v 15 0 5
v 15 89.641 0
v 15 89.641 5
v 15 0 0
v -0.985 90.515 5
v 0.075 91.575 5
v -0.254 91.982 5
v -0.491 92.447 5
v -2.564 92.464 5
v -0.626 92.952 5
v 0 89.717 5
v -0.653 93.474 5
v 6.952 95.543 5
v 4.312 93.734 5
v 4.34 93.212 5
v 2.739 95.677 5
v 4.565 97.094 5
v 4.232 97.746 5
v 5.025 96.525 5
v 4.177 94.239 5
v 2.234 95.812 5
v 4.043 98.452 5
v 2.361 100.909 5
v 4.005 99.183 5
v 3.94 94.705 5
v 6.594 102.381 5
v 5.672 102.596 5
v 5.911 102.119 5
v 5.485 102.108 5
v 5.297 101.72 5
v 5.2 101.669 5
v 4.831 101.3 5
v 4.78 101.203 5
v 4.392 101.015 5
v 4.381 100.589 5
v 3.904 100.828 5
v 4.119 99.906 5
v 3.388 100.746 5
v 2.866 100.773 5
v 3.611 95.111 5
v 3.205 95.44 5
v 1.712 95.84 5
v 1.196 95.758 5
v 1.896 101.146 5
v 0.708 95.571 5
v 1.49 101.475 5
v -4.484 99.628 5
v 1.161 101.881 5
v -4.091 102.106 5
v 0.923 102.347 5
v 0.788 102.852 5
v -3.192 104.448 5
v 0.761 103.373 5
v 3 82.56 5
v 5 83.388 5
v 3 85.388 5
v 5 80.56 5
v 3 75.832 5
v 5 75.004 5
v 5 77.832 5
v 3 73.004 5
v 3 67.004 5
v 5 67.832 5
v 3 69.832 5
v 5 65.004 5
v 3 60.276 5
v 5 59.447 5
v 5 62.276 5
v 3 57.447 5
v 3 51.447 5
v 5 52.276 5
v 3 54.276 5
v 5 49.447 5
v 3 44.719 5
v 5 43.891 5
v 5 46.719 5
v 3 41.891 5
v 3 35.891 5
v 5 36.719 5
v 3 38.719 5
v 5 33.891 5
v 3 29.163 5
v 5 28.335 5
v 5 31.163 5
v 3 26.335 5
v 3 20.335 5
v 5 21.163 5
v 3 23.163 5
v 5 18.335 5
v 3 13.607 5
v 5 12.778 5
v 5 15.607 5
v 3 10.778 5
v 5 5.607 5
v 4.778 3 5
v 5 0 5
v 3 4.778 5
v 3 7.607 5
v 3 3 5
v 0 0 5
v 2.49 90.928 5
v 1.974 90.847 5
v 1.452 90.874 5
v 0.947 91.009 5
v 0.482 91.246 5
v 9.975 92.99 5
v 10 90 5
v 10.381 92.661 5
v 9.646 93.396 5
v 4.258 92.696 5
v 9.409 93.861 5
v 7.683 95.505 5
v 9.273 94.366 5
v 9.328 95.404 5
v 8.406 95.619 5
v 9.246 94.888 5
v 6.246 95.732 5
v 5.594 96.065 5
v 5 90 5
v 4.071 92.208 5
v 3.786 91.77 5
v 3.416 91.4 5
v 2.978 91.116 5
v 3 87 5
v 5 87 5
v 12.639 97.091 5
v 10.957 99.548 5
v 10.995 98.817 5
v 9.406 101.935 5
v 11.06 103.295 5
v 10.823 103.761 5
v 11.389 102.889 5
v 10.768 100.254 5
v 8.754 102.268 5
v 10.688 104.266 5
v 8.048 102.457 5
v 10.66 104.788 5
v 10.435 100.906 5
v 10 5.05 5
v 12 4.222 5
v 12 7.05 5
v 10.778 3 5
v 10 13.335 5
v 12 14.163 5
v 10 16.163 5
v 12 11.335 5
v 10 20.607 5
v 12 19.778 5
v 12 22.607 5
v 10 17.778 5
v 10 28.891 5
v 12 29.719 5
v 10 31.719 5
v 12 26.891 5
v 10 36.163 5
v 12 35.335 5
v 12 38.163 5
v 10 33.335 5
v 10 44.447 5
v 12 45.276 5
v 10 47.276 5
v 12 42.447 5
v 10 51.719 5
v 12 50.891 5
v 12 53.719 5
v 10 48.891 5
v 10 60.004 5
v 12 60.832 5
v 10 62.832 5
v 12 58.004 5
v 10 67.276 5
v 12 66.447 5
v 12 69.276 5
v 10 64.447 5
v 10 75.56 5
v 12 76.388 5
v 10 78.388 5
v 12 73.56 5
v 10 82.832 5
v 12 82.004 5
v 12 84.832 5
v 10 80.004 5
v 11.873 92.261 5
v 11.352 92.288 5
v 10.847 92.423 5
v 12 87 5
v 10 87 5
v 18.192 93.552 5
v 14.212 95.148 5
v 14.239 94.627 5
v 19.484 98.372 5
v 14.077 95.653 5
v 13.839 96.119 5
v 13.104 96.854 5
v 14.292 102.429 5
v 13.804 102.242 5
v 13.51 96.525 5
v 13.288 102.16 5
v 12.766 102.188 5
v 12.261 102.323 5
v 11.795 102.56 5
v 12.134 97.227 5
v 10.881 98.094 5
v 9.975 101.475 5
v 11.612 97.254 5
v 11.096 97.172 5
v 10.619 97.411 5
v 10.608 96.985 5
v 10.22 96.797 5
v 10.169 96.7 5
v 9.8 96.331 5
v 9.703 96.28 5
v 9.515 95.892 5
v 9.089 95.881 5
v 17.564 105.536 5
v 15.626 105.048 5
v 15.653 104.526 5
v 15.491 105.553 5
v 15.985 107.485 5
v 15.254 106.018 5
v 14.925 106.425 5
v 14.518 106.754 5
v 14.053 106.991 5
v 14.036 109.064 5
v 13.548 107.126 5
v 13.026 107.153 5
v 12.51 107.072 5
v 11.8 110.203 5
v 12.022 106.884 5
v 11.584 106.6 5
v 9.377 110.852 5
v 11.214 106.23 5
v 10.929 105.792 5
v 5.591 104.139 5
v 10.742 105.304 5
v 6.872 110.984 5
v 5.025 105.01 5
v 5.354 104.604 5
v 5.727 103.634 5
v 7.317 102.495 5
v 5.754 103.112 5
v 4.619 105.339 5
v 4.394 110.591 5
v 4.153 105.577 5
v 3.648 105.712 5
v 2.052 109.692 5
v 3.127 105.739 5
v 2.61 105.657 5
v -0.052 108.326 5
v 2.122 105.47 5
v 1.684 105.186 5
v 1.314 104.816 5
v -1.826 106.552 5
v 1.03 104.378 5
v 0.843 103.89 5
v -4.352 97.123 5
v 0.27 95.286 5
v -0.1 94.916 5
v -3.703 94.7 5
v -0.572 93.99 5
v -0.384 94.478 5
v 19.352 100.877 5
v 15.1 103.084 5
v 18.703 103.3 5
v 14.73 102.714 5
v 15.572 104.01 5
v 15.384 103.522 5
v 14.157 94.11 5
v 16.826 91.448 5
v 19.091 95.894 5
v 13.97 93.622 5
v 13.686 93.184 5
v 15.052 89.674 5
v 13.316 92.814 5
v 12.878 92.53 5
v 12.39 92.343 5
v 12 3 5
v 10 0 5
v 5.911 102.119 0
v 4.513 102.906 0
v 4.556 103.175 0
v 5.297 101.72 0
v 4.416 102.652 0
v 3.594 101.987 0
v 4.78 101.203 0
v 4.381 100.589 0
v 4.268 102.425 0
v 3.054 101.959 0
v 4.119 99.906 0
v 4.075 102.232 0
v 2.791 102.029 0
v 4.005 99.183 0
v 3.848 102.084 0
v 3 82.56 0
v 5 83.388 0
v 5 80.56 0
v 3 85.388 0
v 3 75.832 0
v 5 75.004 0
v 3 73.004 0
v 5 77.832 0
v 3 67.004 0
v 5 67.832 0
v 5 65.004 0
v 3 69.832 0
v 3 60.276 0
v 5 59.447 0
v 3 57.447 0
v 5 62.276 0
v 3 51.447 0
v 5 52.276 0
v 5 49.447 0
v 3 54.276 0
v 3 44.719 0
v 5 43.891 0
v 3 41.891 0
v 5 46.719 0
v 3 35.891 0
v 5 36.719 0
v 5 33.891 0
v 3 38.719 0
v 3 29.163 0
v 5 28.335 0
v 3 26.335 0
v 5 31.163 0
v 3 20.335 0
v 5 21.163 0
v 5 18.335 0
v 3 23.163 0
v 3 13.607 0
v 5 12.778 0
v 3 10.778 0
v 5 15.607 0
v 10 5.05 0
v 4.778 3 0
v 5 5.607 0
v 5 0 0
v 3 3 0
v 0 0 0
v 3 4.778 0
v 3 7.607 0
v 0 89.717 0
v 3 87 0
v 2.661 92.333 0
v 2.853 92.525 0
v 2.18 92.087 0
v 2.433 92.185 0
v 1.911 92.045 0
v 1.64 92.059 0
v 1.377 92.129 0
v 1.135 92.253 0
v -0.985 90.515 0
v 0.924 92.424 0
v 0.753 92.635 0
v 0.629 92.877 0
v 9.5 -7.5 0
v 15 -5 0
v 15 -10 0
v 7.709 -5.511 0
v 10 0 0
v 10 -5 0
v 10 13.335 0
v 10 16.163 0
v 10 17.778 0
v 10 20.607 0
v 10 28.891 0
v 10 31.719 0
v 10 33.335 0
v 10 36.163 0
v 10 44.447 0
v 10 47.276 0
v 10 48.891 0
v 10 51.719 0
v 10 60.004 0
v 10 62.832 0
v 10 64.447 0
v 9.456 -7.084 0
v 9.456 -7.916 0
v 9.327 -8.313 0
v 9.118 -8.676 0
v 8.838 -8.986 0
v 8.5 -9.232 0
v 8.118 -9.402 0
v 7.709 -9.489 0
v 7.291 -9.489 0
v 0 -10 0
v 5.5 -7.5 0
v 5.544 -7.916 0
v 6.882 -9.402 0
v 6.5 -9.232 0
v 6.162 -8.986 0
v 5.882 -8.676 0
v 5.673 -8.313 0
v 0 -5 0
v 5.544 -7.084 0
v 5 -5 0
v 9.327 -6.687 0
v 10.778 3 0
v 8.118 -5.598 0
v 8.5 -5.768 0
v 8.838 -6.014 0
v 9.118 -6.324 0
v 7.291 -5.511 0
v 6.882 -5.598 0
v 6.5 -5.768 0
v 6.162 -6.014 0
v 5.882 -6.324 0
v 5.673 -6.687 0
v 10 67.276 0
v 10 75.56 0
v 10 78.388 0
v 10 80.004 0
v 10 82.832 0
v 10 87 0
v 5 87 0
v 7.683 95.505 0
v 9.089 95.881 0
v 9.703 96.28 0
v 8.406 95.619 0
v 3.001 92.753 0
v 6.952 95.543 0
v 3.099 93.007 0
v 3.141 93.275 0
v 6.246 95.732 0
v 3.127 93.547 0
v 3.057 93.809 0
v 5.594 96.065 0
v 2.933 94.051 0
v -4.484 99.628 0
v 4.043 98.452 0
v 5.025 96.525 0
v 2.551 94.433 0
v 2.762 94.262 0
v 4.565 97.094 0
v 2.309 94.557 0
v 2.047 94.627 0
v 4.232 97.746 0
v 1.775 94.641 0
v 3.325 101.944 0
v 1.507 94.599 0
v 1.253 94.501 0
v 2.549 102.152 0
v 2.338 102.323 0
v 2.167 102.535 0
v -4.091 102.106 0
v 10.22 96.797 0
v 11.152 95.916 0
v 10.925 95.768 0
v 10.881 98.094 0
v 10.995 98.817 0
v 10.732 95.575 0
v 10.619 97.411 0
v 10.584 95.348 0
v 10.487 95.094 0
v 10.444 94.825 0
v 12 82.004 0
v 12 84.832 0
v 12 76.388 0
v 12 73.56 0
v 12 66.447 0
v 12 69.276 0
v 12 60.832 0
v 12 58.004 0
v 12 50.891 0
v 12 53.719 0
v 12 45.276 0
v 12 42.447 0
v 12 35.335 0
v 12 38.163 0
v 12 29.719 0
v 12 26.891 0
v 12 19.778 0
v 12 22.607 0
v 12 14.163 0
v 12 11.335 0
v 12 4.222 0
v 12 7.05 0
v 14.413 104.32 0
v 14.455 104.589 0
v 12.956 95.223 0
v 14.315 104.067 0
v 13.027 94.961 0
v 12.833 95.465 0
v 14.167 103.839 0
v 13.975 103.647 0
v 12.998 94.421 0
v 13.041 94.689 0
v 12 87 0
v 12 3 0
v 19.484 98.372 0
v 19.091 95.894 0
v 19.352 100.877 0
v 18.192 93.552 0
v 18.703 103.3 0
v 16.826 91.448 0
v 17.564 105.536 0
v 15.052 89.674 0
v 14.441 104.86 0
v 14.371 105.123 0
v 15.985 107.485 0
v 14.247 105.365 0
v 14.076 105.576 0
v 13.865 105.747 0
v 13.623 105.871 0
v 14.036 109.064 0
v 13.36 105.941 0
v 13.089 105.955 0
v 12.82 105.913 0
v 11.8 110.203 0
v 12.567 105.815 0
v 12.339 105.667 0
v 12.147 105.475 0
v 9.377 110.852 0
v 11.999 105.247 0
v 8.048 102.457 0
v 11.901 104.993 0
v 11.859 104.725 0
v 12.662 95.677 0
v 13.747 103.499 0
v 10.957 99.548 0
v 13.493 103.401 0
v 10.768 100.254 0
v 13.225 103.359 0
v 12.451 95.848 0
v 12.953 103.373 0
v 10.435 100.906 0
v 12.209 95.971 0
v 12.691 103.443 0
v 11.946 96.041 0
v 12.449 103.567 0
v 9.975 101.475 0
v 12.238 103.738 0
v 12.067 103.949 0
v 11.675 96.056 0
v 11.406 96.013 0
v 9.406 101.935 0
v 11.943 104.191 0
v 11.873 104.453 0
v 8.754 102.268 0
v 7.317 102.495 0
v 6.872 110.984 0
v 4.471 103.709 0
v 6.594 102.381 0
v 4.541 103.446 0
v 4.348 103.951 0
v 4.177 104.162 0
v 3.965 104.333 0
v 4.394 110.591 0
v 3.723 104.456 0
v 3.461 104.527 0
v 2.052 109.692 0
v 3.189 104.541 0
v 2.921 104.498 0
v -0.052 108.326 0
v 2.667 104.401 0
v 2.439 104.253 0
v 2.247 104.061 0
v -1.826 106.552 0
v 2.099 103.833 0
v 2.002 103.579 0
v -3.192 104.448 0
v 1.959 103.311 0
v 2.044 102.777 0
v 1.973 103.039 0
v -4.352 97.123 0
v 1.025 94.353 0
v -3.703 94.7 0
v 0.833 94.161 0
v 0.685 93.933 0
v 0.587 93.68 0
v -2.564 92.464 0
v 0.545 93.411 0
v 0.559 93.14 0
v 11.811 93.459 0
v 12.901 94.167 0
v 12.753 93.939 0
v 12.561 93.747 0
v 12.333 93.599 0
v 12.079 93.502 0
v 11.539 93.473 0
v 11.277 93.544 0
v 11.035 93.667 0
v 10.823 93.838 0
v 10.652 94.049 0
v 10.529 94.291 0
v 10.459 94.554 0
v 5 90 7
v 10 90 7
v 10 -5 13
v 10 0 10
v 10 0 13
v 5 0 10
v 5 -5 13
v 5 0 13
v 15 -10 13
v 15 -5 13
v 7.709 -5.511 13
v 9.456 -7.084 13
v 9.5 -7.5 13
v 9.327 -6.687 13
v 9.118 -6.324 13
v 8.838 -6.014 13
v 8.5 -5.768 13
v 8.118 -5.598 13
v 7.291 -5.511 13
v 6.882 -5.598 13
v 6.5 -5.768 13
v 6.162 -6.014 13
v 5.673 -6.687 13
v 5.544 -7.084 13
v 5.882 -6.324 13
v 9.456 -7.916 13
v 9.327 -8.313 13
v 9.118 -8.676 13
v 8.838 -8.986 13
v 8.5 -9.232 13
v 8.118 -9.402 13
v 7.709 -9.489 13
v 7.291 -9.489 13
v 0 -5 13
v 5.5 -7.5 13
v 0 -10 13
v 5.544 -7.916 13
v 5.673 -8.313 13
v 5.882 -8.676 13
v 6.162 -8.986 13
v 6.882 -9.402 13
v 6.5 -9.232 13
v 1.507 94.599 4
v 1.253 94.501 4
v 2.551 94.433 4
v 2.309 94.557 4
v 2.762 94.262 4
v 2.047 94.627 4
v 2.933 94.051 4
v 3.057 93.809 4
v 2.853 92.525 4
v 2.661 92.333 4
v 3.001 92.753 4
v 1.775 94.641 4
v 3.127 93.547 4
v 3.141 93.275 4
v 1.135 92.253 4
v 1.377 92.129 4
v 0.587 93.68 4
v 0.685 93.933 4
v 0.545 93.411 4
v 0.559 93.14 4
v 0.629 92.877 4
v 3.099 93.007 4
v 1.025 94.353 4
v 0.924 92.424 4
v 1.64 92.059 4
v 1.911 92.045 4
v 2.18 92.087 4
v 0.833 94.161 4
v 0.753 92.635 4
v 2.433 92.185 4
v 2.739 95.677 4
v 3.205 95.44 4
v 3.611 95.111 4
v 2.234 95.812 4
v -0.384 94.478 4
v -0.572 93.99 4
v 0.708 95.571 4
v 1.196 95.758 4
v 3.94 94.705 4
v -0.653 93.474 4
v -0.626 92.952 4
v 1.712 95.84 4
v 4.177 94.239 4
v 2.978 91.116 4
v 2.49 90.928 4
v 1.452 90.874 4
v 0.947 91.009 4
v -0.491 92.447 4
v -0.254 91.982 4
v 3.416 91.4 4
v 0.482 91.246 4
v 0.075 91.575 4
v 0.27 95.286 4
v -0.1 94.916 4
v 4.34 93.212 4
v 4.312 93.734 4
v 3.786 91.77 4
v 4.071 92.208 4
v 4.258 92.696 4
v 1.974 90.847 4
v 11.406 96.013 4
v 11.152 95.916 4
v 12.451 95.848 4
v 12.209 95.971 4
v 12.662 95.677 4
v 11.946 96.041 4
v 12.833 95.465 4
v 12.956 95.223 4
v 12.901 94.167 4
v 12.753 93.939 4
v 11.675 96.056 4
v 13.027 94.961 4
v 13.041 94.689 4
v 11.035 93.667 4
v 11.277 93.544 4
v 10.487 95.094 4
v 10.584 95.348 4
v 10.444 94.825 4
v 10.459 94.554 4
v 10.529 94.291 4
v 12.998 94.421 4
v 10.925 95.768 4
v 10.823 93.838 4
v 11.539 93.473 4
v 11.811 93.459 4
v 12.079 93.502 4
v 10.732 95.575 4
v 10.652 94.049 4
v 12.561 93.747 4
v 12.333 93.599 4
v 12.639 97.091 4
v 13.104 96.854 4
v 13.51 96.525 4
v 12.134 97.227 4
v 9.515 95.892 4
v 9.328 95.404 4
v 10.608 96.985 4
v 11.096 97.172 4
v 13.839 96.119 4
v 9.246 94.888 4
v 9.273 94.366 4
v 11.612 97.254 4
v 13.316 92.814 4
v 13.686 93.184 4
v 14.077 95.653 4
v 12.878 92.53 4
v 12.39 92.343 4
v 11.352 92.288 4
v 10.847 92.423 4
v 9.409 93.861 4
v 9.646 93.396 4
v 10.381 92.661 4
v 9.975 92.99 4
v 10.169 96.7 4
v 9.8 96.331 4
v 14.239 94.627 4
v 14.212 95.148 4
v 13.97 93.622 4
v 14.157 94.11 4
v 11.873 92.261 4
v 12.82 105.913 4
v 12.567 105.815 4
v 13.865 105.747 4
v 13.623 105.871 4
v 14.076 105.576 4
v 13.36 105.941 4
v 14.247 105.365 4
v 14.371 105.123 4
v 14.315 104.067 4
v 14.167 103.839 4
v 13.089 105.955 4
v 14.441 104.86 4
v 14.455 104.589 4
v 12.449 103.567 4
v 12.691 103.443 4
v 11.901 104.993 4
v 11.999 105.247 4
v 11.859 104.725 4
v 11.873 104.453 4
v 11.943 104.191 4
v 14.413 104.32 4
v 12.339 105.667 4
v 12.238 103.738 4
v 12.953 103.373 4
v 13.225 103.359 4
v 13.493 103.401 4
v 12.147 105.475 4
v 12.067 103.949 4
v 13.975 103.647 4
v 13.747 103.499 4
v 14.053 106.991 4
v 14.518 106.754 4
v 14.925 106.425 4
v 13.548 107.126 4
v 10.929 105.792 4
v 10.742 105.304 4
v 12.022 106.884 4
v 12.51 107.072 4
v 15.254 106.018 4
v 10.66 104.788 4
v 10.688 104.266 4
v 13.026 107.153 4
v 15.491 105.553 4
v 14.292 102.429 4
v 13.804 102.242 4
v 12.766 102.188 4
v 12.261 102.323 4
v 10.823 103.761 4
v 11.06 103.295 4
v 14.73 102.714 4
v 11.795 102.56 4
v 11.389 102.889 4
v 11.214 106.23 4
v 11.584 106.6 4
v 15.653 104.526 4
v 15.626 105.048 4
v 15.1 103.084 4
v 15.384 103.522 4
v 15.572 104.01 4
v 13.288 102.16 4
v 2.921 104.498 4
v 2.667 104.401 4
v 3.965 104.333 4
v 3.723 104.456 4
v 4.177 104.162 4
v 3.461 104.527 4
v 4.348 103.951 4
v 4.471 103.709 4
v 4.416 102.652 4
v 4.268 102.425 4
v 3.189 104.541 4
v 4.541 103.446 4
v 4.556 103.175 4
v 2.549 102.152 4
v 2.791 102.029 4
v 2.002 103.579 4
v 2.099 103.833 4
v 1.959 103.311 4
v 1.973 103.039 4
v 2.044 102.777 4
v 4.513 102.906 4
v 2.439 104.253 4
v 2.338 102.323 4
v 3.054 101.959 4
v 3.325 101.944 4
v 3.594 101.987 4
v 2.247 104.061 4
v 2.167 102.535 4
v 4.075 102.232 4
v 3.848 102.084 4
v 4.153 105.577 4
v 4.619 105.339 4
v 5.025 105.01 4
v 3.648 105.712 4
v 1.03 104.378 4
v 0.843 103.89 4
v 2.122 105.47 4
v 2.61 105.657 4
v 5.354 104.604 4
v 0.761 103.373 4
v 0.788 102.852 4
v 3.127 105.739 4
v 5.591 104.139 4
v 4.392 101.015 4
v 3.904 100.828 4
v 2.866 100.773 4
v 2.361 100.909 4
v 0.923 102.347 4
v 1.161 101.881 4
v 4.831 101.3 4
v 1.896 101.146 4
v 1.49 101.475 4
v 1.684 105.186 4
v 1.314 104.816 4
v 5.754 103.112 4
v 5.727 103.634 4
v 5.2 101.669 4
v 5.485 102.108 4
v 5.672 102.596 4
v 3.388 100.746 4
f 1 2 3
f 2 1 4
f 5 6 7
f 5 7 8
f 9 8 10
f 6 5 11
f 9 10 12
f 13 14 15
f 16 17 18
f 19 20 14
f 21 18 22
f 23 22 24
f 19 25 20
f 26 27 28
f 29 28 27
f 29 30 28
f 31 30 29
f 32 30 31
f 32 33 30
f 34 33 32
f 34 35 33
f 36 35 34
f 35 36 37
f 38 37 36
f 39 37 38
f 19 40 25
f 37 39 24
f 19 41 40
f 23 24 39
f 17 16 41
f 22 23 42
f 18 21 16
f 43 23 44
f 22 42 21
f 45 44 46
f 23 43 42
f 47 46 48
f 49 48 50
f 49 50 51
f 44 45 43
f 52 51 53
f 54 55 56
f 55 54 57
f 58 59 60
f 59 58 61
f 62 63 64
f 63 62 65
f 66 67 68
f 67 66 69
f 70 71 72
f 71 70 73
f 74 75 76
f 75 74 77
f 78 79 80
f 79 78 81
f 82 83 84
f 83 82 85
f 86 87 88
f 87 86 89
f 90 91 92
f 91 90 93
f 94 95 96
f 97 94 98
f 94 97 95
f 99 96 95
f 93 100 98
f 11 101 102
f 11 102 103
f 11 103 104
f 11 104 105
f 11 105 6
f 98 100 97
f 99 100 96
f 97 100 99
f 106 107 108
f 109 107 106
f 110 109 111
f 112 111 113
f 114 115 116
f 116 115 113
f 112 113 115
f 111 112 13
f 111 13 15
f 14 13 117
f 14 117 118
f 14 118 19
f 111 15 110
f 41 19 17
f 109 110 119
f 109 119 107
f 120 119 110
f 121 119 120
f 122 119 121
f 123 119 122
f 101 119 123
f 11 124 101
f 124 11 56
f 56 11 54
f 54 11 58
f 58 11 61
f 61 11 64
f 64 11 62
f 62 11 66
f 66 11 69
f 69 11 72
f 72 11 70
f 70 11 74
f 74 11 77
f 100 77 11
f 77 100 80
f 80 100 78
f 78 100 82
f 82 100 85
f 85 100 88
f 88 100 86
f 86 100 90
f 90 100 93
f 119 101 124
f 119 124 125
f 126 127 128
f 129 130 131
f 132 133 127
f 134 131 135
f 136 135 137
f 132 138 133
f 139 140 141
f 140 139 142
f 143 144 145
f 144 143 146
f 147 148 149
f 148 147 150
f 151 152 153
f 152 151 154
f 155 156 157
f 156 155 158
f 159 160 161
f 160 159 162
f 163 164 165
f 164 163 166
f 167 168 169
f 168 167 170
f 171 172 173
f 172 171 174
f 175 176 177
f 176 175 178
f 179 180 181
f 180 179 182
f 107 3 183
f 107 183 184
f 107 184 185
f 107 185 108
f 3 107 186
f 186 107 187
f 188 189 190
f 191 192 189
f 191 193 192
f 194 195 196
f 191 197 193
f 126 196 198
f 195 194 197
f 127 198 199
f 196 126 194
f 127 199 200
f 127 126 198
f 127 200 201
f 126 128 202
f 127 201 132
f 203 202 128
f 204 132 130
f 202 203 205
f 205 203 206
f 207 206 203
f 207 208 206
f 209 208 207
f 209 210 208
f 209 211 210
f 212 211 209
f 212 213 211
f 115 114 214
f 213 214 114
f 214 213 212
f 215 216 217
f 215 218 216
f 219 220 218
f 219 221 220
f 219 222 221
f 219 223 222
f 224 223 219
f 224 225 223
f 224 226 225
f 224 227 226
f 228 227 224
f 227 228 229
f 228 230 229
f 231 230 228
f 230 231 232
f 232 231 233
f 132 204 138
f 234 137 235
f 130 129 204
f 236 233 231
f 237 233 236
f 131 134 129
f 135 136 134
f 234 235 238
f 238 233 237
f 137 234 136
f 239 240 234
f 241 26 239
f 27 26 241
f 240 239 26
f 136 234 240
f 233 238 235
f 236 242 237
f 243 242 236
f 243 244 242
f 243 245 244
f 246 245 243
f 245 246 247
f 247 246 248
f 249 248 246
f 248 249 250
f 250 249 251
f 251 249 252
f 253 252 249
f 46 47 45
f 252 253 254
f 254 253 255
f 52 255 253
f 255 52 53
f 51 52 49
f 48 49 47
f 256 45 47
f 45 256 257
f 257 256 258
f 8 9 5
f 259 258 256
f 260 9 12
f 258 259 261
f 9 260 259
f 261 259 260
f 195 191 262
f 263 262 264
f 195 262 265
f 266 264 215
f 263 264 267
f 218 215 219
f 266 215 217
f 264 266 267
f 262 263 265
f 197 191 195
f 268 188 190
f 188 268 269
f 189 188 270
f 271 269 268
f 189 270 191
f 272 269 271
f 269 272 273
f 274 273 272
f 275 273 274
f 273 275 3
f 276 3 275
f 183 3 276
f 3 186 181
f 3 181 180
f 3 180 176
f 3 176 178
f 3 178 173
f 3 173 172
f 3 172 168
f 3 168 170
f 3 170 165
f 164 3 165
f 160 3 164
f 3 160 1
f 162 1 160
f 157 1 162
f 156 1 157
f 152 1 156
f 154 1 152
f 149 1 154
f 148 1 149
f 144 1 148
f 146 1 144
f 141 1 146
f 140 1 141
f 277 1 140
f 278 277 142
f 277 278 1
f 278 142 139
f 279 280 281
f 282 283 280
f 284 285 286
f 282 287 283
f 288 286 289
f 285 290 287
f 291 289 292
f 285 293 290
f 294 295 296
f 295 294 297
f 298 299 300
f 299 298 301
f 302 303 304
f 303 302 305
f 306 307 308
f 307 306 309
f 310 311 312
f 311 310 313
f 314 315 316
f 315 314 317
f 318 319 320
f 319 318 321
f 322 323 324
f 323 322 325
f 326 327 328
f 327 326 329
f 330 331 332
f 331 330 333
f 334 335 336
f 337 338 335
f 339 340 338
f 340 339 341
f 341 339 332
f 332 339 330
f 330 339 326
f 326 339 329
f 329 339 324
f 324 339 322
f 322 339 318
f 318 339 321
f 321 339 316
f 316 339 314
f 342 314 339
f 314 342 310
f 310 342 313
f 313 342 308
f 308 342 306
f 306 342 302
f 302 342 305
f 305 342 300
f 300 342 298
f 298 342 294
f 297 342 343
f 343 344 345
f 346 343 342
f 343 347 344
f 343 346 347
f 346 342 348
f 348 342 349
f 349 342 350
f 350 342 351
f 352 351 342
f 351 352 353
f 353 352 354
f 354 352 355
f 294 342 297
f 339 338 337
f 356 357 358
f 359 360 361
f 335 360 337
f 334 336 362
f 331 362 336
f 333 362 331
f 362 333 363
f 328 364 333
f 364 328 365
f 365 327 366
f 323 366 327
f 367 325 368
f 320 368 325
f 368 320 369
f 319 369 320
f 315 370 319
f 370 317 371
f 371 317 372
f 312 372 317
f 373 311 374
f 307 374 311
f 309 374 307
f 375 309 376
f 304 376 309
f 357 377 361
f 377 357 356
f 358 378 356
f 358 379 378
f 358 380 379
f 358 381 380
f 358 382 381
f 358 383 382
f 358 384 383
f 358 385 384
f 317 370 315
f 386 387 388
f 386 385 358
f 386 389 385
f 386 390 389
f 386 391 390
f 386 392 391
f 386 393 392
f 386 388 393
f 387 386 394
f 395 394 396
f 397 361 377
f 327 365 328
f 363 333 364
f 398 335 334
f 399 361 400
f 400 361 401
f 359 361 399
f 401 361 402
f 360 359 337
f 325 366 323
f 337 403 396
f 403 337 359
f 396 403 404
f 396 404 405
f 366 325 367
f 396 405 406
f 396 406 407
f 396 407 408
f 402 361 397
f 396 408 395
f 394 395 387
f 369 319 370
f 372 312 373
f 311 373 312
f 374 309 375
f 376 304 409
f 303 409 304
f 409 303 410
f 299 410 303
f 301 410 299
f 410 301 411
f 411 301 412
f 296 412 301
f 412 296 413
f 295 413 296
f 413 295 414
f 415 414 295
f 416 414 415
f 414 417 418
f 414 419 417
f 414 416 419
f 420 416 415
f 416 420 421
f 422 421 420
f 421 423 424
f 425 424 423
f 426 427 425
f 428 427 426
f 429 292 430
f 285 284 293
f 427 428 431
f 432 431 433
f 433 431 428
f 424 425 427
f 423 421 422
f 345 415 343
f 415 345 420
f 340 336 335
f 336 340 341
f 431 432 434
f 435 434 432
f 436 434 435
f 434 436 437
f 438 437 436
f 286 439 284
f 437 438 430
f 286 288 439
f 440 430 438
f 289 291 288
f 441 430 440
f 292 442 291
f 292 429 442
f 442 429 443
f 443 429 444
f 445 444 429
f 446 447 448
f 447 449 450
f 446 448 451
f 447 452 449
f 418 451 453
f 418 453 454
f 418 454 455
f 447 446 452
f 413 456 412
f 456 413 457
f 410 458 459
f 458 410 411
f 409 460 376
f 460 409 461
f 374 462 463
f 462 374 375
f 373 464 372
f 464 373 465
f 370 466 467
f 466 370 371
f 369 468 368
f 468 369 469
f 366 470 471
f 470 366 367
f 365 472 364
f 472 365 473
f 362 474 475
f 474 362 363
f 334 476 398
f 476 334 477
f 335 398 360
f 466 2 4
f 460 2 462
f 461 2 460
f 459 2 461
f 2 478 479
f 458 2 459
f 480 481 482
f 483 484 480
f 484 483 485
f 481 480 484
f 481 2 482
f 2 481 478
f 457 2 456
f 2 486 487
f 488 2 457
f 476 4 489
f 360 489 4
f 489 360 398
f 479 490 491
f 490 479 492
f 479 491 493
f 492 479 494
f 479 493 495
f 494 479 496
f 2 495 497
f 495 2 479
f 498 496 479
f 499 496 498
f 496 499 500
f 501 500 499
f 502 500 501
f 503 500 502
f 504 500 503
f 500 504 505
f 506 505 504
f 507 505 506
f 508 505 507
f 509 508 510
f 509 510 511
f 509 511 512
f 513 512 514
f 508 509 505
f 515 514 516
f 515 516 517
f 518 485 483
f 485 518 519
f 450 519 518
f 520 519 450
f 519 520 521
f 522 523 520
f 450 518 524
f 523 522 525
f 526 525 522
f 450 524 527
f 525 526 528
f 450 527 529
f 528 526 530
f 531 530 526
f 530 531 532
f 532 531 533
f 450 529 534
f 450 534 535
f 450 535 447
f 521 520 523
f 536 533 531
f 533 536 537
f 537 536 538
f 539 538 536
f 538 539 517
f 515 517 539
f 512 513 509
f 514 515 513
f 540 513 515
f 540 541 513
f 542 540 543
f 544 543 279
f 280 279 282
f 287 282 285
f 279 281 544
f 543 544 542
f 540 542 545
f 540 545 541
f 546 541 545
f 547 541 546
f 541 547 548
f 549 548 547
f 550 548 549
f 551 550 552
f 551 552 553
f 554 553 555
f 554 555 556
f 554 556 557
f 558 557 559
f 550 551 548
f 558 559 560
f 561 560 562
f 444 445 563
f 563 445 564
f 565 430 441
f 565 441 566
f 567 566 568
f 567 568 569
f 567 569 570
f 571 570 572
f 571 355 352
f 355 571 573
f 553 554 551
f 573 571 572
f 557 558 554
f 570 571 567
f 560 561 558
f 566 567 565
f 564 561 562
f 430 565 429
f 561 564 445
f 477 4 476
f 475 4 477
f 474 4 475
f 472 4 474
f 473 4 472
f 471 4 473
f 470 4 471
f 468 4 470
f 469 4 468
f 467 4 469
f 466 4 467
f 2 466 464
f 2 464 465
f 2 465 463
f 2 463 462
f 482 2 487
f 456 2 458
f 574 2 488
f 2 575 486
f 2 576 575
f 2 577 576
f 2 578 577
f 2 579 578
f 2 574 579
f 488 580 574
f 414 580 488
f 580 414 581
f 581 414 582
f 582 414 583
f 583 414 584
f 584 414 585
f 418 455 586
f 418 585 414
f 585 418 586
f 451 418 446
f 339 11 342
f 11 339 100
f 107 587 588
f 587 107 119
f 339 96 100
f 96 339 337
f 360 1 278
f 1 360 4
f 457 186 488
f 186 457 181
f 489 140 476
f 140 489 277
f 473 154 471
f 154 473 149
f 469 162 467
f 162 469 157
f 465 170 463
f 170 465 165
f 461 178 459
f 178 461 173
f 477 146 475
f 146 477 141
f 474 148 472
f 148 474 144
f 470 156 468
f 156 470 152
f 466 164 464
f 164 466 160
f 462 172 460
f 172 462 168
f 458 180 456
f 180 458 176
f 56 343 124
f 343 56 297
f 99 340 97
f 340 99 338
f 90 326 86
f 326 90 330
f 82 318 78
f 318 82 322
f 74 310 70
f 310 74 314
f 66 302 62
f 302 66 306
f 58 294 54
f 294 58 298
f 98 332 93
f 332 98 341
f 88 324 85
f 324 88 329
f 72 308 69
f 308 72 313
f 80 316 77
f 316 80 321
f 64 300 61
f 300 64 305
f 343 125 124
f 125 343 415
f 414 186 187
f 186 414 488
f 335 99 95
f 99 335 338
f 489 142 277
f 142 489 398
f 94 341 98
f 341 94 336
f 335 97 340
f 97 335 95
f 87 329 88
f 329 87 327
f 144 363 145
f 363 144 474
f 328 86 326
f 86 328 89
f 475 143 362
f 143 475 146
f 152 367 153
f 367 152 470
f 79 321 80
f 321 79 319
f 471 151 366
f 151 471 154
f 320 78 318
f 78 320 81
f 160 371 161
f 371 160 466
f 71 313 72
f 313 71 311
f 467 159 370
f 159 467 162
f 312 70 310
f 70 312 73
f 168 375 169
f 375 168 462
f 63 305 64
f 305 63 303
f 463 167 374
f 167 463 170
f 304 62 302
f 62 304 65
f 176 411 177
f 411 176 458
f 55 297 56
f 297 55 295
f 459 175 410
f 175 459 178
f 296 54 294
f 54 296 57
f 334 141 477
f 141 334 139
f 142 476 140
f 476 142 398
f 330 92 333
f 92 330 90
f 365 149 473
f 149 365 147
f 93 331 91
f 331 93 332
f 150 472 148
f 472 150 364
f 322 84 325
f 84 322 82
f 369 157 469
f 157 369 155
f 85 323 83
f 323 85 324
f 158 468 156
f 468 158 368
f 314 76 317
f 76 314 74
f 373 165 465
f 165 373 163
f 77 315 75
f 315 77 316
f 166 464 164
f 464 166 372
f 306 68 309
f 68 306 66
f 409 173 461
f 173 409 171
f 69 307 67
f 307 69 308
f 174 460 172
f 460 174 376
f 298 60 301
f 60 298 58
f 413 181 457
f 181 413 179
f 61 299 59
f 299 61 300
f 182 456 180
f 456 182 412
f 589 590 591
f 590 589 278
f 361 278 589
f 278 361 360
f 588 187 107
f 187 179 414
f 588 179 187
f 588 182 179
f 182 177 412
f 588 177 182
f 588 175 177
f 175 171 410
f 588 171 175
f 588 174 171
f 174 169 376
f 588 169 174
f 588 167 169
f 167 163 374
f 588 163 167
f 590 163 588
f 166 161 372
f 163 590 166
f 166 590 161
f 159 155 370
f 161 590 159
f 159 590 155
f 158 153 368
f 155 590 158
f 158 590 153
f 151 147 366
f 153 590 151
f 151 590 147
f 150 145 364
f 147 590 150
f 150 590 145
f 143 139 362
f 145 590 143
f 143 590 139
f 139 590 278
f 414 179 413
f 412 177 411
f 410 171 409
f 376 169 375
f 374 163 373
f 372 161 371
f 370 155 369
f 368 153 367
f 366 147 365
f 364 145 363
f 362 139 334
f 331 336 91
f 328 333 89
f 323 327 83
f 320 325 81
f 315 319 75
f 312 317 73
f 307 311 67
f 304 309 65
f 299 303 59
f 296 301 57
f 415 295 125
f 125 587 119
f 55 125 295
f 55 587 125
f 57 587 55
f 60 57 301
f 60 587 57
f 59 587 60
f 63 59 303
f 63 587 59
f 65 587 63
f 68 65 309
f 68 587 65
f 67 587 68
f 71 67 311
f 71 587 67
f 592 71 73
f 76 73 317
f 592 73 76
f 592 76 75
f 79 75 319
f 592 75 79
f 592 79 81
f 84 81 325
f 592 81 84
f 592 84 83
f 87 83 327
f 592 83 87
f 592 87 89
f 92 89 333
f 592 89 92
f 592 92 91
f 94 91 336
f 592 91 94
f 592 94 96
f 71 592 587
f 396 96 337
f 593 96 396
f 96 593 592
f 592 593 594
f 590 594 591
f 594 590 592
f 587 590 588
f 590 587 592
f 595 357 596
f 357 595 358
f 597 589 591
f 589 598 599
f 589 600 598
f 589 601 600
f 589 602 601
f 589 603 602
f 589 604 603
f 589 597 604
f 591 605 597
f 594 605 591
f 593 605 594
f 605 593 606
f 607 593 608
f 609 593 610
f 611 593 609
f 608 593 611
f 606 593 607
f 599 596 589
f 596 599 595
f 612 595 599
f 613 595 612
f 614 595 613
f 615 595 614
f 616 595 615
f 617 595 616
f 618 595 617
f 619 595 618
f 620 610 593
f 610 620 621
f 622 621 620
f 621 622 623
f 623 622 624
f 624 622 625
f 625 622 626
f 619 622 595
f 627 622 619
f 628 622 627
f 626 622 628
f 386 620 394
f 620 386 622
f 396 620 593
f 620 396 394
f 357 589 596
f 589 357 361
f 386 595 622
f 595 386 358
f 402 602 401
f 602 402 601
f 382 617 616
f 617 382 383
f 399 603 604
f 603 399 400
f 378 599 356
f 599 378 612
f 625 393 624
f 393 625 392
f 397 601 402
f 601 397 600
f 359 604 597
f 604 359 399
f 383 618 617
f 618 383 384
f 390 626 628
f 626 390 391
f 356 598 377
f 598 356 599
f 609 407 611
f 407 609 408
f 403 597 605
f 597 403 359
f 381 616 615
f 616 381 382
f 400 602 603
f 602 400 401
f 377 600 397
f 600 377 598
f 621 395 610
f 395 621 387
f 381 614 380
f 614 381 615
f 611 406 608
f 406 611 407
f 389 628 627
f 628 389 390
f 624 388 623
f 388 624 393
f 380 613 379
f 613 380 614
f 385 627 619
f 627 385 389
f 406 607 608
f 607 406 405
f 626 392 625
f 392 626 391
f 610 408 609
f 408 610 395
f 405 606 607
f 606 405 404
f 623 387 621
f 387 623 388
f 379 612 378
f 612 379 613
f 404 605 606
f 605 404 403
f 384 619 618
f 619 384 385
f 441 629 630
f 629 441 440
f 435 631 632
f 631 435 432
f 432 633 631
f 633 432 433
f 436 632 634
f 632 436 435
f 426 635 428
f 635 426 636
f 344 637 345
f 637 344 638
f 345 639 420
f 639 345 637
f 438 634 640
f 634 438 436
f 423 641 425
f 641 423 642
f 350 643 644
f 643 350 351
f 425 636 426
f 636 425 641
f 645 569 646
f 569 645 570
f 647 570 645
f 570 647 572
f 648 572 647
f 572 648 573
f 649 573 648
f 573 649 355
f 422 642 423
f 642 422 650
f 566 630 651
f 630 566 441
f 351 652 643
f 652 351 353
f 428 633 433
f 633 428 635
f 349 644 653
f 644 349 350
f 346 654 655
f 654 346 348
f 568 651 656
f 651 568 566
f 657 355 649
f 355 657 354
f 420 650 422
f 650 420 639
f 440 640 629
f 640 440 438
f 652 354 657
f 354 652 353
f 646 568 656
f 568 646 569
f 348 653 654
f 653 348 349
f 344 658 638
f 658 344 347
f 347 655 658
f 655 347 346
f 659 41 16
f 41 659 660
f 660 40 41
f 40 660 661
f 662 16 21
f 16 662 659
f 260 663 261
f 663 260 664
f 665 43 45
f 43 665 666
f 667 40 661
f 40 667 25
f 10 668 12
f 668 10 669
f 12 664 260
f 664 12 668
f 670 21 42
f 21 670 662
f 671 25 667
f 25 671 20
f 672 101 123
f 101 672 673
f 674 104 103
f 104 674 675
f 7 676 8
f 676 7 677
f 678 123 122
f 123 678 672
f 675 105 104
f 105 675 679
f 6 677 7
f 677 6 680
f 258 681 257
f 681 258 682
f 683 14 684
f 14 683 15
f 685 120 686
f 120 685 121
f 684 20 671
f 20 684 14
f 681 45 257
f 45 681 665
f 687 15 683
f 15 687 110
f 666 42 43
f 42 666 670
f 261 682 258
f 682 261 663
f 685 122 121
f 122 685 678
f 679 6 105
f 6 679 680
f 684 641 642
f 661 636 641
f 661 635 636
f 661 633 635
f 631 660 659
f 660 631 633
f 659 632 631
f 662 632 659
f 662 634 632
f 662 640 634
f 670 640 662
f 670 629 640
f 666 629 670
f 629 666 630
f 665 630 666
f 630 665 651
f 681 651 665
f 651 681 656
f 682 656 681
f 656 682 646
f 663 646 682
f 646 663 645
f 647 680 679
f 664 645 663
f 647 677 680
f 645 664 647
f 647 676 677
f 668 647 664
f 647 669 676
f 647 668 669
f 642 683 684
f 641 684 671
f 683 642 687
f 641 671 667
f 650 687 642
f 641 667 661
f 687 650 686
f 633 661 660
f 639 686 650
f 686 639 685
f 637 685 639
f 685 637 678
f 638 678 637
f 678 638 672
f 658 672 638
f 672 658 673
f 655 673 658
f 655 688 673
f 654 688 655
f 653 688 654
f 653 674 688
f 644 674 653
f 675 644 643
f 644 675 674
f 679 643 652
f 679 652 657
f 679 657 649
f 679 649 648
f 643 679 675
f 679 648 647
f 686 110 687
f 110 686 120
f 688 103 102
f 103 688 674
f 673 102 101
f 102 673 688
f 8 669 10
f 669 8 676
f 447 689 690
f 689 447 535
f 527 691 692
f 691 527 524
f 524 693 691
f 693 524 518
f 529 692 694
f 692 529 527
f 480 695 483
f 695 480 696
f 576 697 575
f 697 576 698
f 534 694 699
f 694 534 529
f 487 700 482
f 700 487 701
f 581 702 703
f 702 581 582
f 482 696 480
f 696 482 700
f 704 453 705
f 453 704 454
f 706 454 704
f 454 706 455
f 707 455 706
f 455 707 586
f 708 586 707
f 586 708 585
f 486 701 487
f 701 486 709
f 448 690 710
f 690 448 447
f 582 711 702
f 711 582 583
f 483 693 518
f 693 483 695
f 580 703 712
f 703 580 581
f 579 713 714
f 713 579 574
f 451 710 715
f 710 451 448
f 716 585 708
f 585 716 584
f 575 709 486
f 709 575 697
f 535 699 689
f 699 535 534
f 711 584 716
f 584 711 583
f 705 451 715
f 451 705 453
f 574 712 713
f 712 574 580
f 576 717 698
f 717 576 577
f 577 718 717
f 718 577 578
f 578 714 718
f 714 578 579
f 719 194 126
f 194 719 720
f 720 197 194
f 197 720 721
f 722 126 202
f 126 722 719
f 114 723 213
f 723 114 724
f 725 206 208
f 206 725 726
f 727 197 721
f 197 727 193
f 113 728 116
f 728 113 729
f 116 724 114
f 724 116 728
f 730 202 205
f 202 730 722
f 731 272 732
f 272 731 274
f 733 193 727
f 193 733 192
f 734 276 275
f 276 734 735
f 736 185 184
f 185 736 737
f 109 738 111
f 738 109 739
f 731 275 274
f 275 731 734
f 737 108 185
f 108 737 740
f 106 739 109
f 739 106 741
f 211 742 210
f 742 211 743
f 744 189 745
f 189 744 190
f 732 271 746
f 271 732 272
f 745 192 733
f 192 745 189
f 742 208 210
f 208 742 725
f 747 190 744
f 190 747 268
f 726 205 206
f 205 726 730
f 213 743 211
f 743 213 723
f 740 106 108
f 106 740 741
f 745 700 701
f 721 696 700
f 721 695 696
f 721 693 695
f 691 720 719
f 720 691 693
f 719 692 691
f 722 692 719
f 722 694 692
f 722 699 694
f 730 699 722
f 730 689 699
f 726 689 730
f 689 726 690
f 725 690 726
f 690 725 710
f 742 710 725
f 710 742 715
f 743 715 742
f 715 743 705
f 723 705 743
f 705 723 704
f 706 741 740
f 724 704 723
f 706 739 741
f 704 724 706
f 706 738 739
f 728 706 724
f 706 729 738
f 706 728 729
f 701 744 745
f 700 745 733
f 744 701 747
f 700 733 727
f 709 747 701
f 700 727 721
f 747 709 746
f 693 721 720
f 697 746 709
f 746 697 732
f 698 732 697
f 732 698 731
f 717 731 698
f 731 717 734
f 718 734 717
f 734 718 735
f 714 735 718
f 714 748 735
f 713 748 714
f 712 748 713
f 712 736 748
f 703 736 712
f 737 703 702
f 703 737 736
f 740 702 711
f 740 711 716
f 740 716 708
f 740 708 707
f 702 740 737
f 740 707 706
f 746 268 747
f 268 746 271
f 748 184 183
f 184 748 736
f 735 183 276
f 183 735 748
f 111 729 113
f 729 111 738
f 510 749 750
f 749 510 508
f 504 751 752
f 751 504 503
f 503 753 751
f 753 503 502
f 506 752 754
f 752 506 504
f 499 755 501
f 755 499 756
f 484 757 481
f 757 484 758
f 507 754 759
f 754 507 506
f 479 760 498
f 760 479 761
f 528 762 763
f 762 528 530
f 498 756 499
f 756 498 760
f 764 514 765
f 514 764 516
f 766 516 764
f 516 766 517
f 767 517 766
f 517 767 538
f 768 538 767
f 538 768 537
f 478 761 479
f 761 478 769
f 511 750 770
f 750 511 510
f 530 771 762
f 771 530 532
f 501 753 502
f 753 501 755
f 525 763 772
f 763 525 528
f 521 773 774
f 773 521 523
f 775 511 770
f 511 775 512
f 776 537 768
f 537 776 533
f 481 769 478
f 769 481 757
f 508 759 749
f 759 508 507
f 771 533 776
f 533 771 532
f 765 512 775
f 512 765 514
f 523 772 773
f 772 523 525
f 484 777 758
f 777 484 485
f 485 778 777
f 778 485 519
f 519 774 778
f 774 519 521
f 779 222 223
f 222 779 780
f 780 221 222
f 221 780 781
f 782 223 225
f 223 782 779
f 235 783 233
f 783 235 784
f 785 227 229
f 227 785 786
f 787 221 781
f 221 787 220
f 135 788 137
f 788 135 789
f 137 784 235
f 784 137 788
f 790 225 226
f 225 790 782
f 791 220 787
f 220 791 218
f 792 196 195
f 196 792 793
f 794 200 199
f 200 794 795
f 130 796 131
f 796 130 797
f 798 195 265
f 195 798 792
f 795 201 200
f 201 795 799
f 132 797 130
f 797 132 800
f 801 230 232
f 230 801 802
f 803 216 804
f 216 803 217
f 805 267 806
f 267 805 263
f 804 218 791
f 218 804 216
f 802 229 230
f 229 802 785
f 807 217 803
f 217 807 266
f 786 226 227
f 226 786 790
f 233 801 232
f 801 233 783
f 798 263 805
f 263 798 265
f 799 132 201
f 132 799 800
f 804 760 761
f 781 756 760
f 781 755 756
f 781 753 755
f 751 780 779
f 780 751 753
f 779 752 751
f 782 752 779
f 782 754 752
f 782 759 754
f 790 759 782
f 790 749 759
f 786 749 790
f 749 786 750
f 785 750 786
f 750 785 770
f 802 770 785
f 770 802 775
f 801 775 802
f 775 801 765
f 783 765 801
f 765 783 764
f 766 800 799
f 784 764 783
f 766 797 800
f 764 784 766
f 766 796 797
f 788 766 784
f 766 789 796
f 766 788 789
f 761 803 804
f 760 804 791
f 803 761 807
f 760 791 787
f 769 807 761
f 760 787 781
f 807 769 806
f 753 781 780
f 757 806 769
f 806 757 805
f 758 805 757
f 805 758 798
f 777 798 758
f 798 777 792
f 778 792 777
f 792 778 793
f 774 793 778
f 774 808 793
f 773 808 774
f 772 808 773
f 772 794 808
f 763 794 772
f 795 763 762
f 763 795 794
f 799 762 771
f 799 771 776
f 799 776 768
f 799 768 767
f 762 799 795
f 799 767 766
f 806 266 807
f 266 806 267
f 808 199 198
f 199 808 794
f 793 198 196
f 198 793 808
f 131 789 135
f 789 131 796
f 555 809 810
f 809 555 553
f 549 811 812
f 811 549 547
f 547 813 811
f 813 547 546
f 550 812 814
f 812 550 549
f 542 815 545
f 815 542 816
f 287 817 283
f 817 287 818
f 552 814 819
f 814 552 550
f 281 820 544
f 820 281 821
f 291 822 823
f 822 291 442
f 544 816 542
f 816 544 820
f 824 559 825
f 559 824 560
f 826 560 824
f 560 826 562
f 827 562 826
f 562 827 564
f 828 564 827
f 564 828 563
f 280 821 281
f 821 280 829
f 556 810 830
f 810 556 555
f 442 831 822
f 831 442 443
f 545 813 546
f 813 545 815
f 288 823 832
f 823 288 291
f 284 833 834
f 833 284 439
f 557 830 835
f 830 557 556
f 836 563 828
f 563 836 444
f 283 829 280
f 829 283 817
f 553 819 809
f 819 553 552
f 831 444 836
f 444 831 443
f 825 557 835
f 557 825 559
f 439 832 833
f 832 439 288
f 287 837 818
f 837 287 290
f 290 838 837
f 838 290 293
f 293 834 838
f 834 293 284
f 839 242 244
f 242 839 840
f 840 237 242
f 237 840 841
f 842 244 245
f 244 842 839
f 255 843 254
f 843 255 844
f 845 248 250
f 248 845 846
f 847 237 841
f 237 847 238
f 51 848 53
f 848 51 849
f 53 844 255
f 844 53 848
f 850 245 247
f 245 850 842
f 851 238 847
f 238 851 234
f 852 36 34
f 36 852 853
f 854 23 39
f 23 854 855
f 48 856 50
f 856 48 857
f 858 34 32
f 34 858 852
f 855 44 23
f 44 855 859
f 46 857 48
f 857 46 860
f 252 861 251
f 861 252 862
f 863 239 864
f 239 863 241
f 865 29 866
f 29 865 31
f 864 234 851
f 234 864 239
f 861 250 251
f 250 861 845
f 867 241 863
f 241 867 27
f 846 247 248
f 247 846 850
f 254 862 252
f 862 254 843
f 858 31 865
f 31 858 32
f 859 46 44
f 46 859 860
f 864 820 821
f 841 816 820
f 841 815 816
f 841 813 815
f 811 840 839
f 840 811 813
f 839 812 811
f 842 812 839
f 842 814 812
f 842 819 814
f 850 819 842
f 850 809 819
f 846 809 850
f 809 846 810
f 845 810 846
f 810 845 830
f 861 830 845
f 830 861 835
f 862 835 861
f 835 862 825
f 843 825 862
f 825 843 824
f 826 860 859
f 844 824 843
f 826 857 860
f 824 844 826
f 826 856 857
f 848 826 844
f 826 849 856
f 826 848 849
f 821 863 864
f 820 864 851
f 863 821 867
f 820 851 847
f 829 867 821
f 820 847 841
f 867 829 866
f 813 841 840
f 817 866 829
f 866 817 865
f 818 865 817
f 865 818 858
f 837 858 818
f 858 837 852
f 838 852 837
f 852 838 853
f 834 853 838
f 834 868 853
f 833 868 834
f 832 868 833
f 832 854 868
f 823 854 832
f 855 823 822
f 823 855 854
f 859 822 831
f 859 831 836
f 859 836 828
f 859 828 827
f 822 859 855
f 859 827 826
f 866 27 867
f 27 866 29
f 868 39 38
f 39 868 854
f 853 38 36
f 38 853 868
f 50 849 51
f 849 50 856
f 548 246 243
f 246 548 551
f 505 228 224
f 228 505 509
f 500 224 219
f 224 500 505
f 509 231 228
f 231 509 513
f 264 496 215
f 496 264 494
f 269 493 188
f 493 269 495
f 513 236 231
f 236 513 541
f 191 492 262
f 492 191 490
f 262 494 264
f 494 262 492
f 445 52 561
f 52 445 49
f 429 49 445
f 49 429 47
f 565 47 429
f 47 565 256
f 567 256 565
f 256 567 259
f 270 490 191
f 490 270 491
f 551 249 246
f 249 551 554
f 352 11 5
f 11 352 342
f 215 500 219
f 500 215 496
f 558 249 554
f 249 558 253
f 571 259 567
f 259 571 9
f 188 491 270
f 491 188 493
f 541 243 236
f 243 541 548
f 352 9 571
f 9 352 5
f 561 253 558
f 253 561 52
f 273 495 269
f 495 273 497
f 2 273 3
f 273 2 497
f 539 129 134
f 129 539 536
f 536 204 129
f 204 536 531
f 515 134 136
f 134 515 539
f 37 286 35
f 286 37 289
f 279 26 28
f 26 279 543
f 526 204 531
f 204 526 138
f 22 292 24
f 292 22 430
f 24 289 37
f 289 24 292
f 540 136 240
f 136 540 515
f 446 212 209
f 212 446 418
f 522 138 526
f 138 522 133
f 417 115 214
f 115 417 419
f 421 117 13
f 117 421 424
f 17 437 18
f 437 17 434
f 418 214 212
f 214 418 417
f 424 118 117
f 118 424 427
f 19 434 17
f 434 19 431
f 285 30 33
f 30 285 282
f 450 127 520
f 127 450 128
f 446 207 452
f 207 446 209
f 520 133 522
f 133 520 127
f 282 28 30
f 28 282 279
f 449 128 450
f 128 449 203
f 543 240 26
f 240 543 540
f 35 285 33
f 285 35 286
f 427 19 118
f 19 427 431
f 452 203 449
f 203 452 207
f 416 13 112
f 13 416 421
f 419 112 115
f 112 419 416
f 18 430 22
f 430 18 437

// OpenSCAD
// file: wedge.scad
module wedge(width, length, height)
{ 
    //Calculating the angle of the cutting block;
    angle = atan2(height, length);
    cutterLength = sqrt(pow(length, 2) + pow(height, 2));
    
    difference()
    {
        cube([width, length, height]);
        
        //Cutter
        translate([-1,0,height])
        {
            rotate(-angle, [1,0,0])
            cube([width * 2, cutterLength, height*2]);
        }
    }
}

//cube([10, 100, 10]);

//wedge(10, 100, 25);
// file: mesh.scad
$fn=30;

module rawMesh(barWidth, height, holeWidth, size)
{
    barDistance = barWidth + holeWidth;

    for(x = [0 : size-1])
    {
        translate([barDistance*x, 0, 0])
        {
            cube([barWidth, size*barDistance, height]);
        }
    }

    for(y = [0 : size-1])
    {
        translate([0, barDistance*y, 0])
        {
            cube([size*barDistance, barWidth, height]);
        }
    }
}

module mesh(barWidth, height, holeWidth, size, centered=false)
{
    meshSize = (barWidth + holeWidth) * size;
    echo(meshSize);
    
    rotate(45)
    {
        if(centered == true)
        { 
            translate([-meshSize / 2, -meshSize / 2, 0]) 
            {
                rawMesh(barWidth, height, holeWidth, size);
            }
        }
        else
        {
            rawMesh(barWidth, height, holeWidth, size);
        }
    }
}


//mesh(3, 5, 10, 10, centered=true);
// file: brackets.scad
//Creates a bracket that looks like this:
/*
 *      #     |
 *      #     | length
 *      #     |
 *  ######### | | boomWidth
 *  ---------
 *    width
 */
module tBracket(boomWidth, width, length, height)
{
    //xAxis boom
    cube([width, boomWidth, height]);

    //yAxis boom
    translate([width/2 - boomWidth / 2, 0,0])
    cube([boomWidth, length, height]);
}
// main file
$fn = 30;
include <brackets.scad>;

include <mesh.scad>;
include <wedge.scad>;

ARM_LENGTH = 100;
ARM_WIDTH = 15;
ARM_HEIGHT = 7;
ARM_OUTSIDE_WIDTH = 3;

MESH_HOLE_SIZE = 6;
MESH_BAR_WIDTH = 2;

module motorBracket(diameter, thickness, screw1Radius, screw2Radius, screwholeRadius)
{
    motorShaftDiameter = 7;
    screwheadDiameter = 5;
    screwheadHoleDepth = 1;
    difference()
    {
        cylinder(d=diameter, h=thickness);
        
        //Screw holes
        for(i = [-1, 1])
        {
            translate([screw1Radius * i, 0, 0])
            {
                translate([0, 0, -thickness])
                {
                    cylinder(h=thickness*3, r=screwholeRadius);
                }
                //Screwhead hole
                translate([0, 0, thickness - screwheadHoleDepth])
                {
                    cylinder(h=screwheadHoleDepth * 2, d = screwheadDiameter);
                }
            }
            translate([0, screw2Radius * i, 0])
            {
                translate([0, 0, -thickness])
                {
                    cylinder(h=thickness*3, r=screwholeRadius);
                }
                //Screwhead hole
                translate([0, 0, thickness - screwheadHoleDepth])
                {
                    cylinder(h=screwheadHoleDepth * 2, d = screwheadDiameter);
                }
            }
        }
        //ShaftHole
        translate([0,0,-1]);
        cylinder(h=thickness * 2, d=motorShaftDiameter);
    }
}


module armOutline(width, length, height)
{
    cube([width, length, height]);
}

module armMesh(barWidth, height, holeSize, armWidth, armLength)
{
    intersection()
    {
        armOutline(armWidth, armLength, height);
    
        mesh(barWidth, height, holeSize, 25, centered = true);
    }
}

module armHole(width, length, height, outsideWidth)
{
    holeWidth = width - outsideWidth * 2;
    holeLength = length - outsideWidth * 2;
    difference()
    {
        armOutline(width, length, height);

        translate([width / 2 - holeWidth / 2, length / 2 - holeLength / 2, -height/2])
        cube([holeWidth, holeLength, height * 2]);
    }
}

/*
 * length: length of the arm
 * width: width of the arm
 * flatHeight: The height of the wide part of the arm
 * wegeStart: the height at which the wedges starts,
 * wedgeHeight: the height of the wedge
 */

module armBase(width, length, flatHeight, meshWidth, meshHoleSize, outsideWidth)
{
    armHole(width, length, flatHeight, outsideWidth);
    armMesh(meshWidth, flatHeight, meshHoleSize, width, length);
}

module armWedge(width, length, wedgeStartHeight, wedgeHeight, armWidth)
{
    translate([armWidth / 2 - width/2, 0, 0])
    cube([width, length, wedgeStartHeight]);
    
    //Creating the wedge
    translate([armWidth / 2 - width / 2, 0,wedgeStartHeight])
    wedge(width, length, wedgeHeight);
}
module armBracket(width, length, height, barWidth)
{
    screwholeDiameter = 4;
    difference()
    {
        translate([0, -length, 0])
        {
            tBracket(barWidth, width, length, height);
        }

        //Screwhole
        translate([width/2, -length + barWidth / 2, -1])
        cylinder(h=height * 2, d=screwholeDiameter);
    }
}

module arm(length, width, flatHeight, wedgeWidth, wedgeStart, wedgeHeight, bracketWidth, bracketLength, bracketBarWidth, )
{

    //bottom of the wedge

}

module armMotorBracket(armLength, armWidth)
{
    DIAMETER = 24;
    BRACKET_THICKNESS = 5;
    SCREW1_RADIUS = 8;
    SCREW2_RADIUS = 6;
    OFFSET_DISTANCE = DIAMETER / 2 - 3;

    SCREWHOLE_RADIUS = 1.30;
    
    translate([armWidth / 2, armLength + OFFSET_DISTANCE, 0])
    {
        rotate(45, [0,0,1])
        motorBracket(DIAMETER, BRACKET_THICKNESS, SCREW1_RADIUS, SCREW2_RADIUS, SCREWHOLE_RADIUS);
    }
}

LENGTH = 90;
WIDTH = 15;
HEIGHT = 5;
WEDGE_WIDTH = 5;
WEDGE_START = 7;
WEDGE_HEIGHT = 3;
MESH_BAR_WIDTH = 2;
MESH_HOLE_SIZE = 9;
OUTSIDE_WIDTH = 3;

BRACKET_WIDTH = 15;
BRACKET_LENGTH = 10;
BRACKET_BAR_WIDTH = 5;
BRACKET_HEIGHT = 13;


armBase(WIDTH, LENGTH, HEIGHT, MESH_BAR_WIDTH, MESH_HOLE_SIZE, OUTSIDE_WIDTH);
armWedge(WEDGE_WIDTH, LENGTH, WEDGE_START, WEDGE_HEIGHT, WIDTH);
armBracket(BRACKET_WIDTH, BRACKET_LENGTH, BRACKET_HEIGHT, BRACKET_BAR_WIDTH);
armMotorBracket(LENGTH, WIDTH);
